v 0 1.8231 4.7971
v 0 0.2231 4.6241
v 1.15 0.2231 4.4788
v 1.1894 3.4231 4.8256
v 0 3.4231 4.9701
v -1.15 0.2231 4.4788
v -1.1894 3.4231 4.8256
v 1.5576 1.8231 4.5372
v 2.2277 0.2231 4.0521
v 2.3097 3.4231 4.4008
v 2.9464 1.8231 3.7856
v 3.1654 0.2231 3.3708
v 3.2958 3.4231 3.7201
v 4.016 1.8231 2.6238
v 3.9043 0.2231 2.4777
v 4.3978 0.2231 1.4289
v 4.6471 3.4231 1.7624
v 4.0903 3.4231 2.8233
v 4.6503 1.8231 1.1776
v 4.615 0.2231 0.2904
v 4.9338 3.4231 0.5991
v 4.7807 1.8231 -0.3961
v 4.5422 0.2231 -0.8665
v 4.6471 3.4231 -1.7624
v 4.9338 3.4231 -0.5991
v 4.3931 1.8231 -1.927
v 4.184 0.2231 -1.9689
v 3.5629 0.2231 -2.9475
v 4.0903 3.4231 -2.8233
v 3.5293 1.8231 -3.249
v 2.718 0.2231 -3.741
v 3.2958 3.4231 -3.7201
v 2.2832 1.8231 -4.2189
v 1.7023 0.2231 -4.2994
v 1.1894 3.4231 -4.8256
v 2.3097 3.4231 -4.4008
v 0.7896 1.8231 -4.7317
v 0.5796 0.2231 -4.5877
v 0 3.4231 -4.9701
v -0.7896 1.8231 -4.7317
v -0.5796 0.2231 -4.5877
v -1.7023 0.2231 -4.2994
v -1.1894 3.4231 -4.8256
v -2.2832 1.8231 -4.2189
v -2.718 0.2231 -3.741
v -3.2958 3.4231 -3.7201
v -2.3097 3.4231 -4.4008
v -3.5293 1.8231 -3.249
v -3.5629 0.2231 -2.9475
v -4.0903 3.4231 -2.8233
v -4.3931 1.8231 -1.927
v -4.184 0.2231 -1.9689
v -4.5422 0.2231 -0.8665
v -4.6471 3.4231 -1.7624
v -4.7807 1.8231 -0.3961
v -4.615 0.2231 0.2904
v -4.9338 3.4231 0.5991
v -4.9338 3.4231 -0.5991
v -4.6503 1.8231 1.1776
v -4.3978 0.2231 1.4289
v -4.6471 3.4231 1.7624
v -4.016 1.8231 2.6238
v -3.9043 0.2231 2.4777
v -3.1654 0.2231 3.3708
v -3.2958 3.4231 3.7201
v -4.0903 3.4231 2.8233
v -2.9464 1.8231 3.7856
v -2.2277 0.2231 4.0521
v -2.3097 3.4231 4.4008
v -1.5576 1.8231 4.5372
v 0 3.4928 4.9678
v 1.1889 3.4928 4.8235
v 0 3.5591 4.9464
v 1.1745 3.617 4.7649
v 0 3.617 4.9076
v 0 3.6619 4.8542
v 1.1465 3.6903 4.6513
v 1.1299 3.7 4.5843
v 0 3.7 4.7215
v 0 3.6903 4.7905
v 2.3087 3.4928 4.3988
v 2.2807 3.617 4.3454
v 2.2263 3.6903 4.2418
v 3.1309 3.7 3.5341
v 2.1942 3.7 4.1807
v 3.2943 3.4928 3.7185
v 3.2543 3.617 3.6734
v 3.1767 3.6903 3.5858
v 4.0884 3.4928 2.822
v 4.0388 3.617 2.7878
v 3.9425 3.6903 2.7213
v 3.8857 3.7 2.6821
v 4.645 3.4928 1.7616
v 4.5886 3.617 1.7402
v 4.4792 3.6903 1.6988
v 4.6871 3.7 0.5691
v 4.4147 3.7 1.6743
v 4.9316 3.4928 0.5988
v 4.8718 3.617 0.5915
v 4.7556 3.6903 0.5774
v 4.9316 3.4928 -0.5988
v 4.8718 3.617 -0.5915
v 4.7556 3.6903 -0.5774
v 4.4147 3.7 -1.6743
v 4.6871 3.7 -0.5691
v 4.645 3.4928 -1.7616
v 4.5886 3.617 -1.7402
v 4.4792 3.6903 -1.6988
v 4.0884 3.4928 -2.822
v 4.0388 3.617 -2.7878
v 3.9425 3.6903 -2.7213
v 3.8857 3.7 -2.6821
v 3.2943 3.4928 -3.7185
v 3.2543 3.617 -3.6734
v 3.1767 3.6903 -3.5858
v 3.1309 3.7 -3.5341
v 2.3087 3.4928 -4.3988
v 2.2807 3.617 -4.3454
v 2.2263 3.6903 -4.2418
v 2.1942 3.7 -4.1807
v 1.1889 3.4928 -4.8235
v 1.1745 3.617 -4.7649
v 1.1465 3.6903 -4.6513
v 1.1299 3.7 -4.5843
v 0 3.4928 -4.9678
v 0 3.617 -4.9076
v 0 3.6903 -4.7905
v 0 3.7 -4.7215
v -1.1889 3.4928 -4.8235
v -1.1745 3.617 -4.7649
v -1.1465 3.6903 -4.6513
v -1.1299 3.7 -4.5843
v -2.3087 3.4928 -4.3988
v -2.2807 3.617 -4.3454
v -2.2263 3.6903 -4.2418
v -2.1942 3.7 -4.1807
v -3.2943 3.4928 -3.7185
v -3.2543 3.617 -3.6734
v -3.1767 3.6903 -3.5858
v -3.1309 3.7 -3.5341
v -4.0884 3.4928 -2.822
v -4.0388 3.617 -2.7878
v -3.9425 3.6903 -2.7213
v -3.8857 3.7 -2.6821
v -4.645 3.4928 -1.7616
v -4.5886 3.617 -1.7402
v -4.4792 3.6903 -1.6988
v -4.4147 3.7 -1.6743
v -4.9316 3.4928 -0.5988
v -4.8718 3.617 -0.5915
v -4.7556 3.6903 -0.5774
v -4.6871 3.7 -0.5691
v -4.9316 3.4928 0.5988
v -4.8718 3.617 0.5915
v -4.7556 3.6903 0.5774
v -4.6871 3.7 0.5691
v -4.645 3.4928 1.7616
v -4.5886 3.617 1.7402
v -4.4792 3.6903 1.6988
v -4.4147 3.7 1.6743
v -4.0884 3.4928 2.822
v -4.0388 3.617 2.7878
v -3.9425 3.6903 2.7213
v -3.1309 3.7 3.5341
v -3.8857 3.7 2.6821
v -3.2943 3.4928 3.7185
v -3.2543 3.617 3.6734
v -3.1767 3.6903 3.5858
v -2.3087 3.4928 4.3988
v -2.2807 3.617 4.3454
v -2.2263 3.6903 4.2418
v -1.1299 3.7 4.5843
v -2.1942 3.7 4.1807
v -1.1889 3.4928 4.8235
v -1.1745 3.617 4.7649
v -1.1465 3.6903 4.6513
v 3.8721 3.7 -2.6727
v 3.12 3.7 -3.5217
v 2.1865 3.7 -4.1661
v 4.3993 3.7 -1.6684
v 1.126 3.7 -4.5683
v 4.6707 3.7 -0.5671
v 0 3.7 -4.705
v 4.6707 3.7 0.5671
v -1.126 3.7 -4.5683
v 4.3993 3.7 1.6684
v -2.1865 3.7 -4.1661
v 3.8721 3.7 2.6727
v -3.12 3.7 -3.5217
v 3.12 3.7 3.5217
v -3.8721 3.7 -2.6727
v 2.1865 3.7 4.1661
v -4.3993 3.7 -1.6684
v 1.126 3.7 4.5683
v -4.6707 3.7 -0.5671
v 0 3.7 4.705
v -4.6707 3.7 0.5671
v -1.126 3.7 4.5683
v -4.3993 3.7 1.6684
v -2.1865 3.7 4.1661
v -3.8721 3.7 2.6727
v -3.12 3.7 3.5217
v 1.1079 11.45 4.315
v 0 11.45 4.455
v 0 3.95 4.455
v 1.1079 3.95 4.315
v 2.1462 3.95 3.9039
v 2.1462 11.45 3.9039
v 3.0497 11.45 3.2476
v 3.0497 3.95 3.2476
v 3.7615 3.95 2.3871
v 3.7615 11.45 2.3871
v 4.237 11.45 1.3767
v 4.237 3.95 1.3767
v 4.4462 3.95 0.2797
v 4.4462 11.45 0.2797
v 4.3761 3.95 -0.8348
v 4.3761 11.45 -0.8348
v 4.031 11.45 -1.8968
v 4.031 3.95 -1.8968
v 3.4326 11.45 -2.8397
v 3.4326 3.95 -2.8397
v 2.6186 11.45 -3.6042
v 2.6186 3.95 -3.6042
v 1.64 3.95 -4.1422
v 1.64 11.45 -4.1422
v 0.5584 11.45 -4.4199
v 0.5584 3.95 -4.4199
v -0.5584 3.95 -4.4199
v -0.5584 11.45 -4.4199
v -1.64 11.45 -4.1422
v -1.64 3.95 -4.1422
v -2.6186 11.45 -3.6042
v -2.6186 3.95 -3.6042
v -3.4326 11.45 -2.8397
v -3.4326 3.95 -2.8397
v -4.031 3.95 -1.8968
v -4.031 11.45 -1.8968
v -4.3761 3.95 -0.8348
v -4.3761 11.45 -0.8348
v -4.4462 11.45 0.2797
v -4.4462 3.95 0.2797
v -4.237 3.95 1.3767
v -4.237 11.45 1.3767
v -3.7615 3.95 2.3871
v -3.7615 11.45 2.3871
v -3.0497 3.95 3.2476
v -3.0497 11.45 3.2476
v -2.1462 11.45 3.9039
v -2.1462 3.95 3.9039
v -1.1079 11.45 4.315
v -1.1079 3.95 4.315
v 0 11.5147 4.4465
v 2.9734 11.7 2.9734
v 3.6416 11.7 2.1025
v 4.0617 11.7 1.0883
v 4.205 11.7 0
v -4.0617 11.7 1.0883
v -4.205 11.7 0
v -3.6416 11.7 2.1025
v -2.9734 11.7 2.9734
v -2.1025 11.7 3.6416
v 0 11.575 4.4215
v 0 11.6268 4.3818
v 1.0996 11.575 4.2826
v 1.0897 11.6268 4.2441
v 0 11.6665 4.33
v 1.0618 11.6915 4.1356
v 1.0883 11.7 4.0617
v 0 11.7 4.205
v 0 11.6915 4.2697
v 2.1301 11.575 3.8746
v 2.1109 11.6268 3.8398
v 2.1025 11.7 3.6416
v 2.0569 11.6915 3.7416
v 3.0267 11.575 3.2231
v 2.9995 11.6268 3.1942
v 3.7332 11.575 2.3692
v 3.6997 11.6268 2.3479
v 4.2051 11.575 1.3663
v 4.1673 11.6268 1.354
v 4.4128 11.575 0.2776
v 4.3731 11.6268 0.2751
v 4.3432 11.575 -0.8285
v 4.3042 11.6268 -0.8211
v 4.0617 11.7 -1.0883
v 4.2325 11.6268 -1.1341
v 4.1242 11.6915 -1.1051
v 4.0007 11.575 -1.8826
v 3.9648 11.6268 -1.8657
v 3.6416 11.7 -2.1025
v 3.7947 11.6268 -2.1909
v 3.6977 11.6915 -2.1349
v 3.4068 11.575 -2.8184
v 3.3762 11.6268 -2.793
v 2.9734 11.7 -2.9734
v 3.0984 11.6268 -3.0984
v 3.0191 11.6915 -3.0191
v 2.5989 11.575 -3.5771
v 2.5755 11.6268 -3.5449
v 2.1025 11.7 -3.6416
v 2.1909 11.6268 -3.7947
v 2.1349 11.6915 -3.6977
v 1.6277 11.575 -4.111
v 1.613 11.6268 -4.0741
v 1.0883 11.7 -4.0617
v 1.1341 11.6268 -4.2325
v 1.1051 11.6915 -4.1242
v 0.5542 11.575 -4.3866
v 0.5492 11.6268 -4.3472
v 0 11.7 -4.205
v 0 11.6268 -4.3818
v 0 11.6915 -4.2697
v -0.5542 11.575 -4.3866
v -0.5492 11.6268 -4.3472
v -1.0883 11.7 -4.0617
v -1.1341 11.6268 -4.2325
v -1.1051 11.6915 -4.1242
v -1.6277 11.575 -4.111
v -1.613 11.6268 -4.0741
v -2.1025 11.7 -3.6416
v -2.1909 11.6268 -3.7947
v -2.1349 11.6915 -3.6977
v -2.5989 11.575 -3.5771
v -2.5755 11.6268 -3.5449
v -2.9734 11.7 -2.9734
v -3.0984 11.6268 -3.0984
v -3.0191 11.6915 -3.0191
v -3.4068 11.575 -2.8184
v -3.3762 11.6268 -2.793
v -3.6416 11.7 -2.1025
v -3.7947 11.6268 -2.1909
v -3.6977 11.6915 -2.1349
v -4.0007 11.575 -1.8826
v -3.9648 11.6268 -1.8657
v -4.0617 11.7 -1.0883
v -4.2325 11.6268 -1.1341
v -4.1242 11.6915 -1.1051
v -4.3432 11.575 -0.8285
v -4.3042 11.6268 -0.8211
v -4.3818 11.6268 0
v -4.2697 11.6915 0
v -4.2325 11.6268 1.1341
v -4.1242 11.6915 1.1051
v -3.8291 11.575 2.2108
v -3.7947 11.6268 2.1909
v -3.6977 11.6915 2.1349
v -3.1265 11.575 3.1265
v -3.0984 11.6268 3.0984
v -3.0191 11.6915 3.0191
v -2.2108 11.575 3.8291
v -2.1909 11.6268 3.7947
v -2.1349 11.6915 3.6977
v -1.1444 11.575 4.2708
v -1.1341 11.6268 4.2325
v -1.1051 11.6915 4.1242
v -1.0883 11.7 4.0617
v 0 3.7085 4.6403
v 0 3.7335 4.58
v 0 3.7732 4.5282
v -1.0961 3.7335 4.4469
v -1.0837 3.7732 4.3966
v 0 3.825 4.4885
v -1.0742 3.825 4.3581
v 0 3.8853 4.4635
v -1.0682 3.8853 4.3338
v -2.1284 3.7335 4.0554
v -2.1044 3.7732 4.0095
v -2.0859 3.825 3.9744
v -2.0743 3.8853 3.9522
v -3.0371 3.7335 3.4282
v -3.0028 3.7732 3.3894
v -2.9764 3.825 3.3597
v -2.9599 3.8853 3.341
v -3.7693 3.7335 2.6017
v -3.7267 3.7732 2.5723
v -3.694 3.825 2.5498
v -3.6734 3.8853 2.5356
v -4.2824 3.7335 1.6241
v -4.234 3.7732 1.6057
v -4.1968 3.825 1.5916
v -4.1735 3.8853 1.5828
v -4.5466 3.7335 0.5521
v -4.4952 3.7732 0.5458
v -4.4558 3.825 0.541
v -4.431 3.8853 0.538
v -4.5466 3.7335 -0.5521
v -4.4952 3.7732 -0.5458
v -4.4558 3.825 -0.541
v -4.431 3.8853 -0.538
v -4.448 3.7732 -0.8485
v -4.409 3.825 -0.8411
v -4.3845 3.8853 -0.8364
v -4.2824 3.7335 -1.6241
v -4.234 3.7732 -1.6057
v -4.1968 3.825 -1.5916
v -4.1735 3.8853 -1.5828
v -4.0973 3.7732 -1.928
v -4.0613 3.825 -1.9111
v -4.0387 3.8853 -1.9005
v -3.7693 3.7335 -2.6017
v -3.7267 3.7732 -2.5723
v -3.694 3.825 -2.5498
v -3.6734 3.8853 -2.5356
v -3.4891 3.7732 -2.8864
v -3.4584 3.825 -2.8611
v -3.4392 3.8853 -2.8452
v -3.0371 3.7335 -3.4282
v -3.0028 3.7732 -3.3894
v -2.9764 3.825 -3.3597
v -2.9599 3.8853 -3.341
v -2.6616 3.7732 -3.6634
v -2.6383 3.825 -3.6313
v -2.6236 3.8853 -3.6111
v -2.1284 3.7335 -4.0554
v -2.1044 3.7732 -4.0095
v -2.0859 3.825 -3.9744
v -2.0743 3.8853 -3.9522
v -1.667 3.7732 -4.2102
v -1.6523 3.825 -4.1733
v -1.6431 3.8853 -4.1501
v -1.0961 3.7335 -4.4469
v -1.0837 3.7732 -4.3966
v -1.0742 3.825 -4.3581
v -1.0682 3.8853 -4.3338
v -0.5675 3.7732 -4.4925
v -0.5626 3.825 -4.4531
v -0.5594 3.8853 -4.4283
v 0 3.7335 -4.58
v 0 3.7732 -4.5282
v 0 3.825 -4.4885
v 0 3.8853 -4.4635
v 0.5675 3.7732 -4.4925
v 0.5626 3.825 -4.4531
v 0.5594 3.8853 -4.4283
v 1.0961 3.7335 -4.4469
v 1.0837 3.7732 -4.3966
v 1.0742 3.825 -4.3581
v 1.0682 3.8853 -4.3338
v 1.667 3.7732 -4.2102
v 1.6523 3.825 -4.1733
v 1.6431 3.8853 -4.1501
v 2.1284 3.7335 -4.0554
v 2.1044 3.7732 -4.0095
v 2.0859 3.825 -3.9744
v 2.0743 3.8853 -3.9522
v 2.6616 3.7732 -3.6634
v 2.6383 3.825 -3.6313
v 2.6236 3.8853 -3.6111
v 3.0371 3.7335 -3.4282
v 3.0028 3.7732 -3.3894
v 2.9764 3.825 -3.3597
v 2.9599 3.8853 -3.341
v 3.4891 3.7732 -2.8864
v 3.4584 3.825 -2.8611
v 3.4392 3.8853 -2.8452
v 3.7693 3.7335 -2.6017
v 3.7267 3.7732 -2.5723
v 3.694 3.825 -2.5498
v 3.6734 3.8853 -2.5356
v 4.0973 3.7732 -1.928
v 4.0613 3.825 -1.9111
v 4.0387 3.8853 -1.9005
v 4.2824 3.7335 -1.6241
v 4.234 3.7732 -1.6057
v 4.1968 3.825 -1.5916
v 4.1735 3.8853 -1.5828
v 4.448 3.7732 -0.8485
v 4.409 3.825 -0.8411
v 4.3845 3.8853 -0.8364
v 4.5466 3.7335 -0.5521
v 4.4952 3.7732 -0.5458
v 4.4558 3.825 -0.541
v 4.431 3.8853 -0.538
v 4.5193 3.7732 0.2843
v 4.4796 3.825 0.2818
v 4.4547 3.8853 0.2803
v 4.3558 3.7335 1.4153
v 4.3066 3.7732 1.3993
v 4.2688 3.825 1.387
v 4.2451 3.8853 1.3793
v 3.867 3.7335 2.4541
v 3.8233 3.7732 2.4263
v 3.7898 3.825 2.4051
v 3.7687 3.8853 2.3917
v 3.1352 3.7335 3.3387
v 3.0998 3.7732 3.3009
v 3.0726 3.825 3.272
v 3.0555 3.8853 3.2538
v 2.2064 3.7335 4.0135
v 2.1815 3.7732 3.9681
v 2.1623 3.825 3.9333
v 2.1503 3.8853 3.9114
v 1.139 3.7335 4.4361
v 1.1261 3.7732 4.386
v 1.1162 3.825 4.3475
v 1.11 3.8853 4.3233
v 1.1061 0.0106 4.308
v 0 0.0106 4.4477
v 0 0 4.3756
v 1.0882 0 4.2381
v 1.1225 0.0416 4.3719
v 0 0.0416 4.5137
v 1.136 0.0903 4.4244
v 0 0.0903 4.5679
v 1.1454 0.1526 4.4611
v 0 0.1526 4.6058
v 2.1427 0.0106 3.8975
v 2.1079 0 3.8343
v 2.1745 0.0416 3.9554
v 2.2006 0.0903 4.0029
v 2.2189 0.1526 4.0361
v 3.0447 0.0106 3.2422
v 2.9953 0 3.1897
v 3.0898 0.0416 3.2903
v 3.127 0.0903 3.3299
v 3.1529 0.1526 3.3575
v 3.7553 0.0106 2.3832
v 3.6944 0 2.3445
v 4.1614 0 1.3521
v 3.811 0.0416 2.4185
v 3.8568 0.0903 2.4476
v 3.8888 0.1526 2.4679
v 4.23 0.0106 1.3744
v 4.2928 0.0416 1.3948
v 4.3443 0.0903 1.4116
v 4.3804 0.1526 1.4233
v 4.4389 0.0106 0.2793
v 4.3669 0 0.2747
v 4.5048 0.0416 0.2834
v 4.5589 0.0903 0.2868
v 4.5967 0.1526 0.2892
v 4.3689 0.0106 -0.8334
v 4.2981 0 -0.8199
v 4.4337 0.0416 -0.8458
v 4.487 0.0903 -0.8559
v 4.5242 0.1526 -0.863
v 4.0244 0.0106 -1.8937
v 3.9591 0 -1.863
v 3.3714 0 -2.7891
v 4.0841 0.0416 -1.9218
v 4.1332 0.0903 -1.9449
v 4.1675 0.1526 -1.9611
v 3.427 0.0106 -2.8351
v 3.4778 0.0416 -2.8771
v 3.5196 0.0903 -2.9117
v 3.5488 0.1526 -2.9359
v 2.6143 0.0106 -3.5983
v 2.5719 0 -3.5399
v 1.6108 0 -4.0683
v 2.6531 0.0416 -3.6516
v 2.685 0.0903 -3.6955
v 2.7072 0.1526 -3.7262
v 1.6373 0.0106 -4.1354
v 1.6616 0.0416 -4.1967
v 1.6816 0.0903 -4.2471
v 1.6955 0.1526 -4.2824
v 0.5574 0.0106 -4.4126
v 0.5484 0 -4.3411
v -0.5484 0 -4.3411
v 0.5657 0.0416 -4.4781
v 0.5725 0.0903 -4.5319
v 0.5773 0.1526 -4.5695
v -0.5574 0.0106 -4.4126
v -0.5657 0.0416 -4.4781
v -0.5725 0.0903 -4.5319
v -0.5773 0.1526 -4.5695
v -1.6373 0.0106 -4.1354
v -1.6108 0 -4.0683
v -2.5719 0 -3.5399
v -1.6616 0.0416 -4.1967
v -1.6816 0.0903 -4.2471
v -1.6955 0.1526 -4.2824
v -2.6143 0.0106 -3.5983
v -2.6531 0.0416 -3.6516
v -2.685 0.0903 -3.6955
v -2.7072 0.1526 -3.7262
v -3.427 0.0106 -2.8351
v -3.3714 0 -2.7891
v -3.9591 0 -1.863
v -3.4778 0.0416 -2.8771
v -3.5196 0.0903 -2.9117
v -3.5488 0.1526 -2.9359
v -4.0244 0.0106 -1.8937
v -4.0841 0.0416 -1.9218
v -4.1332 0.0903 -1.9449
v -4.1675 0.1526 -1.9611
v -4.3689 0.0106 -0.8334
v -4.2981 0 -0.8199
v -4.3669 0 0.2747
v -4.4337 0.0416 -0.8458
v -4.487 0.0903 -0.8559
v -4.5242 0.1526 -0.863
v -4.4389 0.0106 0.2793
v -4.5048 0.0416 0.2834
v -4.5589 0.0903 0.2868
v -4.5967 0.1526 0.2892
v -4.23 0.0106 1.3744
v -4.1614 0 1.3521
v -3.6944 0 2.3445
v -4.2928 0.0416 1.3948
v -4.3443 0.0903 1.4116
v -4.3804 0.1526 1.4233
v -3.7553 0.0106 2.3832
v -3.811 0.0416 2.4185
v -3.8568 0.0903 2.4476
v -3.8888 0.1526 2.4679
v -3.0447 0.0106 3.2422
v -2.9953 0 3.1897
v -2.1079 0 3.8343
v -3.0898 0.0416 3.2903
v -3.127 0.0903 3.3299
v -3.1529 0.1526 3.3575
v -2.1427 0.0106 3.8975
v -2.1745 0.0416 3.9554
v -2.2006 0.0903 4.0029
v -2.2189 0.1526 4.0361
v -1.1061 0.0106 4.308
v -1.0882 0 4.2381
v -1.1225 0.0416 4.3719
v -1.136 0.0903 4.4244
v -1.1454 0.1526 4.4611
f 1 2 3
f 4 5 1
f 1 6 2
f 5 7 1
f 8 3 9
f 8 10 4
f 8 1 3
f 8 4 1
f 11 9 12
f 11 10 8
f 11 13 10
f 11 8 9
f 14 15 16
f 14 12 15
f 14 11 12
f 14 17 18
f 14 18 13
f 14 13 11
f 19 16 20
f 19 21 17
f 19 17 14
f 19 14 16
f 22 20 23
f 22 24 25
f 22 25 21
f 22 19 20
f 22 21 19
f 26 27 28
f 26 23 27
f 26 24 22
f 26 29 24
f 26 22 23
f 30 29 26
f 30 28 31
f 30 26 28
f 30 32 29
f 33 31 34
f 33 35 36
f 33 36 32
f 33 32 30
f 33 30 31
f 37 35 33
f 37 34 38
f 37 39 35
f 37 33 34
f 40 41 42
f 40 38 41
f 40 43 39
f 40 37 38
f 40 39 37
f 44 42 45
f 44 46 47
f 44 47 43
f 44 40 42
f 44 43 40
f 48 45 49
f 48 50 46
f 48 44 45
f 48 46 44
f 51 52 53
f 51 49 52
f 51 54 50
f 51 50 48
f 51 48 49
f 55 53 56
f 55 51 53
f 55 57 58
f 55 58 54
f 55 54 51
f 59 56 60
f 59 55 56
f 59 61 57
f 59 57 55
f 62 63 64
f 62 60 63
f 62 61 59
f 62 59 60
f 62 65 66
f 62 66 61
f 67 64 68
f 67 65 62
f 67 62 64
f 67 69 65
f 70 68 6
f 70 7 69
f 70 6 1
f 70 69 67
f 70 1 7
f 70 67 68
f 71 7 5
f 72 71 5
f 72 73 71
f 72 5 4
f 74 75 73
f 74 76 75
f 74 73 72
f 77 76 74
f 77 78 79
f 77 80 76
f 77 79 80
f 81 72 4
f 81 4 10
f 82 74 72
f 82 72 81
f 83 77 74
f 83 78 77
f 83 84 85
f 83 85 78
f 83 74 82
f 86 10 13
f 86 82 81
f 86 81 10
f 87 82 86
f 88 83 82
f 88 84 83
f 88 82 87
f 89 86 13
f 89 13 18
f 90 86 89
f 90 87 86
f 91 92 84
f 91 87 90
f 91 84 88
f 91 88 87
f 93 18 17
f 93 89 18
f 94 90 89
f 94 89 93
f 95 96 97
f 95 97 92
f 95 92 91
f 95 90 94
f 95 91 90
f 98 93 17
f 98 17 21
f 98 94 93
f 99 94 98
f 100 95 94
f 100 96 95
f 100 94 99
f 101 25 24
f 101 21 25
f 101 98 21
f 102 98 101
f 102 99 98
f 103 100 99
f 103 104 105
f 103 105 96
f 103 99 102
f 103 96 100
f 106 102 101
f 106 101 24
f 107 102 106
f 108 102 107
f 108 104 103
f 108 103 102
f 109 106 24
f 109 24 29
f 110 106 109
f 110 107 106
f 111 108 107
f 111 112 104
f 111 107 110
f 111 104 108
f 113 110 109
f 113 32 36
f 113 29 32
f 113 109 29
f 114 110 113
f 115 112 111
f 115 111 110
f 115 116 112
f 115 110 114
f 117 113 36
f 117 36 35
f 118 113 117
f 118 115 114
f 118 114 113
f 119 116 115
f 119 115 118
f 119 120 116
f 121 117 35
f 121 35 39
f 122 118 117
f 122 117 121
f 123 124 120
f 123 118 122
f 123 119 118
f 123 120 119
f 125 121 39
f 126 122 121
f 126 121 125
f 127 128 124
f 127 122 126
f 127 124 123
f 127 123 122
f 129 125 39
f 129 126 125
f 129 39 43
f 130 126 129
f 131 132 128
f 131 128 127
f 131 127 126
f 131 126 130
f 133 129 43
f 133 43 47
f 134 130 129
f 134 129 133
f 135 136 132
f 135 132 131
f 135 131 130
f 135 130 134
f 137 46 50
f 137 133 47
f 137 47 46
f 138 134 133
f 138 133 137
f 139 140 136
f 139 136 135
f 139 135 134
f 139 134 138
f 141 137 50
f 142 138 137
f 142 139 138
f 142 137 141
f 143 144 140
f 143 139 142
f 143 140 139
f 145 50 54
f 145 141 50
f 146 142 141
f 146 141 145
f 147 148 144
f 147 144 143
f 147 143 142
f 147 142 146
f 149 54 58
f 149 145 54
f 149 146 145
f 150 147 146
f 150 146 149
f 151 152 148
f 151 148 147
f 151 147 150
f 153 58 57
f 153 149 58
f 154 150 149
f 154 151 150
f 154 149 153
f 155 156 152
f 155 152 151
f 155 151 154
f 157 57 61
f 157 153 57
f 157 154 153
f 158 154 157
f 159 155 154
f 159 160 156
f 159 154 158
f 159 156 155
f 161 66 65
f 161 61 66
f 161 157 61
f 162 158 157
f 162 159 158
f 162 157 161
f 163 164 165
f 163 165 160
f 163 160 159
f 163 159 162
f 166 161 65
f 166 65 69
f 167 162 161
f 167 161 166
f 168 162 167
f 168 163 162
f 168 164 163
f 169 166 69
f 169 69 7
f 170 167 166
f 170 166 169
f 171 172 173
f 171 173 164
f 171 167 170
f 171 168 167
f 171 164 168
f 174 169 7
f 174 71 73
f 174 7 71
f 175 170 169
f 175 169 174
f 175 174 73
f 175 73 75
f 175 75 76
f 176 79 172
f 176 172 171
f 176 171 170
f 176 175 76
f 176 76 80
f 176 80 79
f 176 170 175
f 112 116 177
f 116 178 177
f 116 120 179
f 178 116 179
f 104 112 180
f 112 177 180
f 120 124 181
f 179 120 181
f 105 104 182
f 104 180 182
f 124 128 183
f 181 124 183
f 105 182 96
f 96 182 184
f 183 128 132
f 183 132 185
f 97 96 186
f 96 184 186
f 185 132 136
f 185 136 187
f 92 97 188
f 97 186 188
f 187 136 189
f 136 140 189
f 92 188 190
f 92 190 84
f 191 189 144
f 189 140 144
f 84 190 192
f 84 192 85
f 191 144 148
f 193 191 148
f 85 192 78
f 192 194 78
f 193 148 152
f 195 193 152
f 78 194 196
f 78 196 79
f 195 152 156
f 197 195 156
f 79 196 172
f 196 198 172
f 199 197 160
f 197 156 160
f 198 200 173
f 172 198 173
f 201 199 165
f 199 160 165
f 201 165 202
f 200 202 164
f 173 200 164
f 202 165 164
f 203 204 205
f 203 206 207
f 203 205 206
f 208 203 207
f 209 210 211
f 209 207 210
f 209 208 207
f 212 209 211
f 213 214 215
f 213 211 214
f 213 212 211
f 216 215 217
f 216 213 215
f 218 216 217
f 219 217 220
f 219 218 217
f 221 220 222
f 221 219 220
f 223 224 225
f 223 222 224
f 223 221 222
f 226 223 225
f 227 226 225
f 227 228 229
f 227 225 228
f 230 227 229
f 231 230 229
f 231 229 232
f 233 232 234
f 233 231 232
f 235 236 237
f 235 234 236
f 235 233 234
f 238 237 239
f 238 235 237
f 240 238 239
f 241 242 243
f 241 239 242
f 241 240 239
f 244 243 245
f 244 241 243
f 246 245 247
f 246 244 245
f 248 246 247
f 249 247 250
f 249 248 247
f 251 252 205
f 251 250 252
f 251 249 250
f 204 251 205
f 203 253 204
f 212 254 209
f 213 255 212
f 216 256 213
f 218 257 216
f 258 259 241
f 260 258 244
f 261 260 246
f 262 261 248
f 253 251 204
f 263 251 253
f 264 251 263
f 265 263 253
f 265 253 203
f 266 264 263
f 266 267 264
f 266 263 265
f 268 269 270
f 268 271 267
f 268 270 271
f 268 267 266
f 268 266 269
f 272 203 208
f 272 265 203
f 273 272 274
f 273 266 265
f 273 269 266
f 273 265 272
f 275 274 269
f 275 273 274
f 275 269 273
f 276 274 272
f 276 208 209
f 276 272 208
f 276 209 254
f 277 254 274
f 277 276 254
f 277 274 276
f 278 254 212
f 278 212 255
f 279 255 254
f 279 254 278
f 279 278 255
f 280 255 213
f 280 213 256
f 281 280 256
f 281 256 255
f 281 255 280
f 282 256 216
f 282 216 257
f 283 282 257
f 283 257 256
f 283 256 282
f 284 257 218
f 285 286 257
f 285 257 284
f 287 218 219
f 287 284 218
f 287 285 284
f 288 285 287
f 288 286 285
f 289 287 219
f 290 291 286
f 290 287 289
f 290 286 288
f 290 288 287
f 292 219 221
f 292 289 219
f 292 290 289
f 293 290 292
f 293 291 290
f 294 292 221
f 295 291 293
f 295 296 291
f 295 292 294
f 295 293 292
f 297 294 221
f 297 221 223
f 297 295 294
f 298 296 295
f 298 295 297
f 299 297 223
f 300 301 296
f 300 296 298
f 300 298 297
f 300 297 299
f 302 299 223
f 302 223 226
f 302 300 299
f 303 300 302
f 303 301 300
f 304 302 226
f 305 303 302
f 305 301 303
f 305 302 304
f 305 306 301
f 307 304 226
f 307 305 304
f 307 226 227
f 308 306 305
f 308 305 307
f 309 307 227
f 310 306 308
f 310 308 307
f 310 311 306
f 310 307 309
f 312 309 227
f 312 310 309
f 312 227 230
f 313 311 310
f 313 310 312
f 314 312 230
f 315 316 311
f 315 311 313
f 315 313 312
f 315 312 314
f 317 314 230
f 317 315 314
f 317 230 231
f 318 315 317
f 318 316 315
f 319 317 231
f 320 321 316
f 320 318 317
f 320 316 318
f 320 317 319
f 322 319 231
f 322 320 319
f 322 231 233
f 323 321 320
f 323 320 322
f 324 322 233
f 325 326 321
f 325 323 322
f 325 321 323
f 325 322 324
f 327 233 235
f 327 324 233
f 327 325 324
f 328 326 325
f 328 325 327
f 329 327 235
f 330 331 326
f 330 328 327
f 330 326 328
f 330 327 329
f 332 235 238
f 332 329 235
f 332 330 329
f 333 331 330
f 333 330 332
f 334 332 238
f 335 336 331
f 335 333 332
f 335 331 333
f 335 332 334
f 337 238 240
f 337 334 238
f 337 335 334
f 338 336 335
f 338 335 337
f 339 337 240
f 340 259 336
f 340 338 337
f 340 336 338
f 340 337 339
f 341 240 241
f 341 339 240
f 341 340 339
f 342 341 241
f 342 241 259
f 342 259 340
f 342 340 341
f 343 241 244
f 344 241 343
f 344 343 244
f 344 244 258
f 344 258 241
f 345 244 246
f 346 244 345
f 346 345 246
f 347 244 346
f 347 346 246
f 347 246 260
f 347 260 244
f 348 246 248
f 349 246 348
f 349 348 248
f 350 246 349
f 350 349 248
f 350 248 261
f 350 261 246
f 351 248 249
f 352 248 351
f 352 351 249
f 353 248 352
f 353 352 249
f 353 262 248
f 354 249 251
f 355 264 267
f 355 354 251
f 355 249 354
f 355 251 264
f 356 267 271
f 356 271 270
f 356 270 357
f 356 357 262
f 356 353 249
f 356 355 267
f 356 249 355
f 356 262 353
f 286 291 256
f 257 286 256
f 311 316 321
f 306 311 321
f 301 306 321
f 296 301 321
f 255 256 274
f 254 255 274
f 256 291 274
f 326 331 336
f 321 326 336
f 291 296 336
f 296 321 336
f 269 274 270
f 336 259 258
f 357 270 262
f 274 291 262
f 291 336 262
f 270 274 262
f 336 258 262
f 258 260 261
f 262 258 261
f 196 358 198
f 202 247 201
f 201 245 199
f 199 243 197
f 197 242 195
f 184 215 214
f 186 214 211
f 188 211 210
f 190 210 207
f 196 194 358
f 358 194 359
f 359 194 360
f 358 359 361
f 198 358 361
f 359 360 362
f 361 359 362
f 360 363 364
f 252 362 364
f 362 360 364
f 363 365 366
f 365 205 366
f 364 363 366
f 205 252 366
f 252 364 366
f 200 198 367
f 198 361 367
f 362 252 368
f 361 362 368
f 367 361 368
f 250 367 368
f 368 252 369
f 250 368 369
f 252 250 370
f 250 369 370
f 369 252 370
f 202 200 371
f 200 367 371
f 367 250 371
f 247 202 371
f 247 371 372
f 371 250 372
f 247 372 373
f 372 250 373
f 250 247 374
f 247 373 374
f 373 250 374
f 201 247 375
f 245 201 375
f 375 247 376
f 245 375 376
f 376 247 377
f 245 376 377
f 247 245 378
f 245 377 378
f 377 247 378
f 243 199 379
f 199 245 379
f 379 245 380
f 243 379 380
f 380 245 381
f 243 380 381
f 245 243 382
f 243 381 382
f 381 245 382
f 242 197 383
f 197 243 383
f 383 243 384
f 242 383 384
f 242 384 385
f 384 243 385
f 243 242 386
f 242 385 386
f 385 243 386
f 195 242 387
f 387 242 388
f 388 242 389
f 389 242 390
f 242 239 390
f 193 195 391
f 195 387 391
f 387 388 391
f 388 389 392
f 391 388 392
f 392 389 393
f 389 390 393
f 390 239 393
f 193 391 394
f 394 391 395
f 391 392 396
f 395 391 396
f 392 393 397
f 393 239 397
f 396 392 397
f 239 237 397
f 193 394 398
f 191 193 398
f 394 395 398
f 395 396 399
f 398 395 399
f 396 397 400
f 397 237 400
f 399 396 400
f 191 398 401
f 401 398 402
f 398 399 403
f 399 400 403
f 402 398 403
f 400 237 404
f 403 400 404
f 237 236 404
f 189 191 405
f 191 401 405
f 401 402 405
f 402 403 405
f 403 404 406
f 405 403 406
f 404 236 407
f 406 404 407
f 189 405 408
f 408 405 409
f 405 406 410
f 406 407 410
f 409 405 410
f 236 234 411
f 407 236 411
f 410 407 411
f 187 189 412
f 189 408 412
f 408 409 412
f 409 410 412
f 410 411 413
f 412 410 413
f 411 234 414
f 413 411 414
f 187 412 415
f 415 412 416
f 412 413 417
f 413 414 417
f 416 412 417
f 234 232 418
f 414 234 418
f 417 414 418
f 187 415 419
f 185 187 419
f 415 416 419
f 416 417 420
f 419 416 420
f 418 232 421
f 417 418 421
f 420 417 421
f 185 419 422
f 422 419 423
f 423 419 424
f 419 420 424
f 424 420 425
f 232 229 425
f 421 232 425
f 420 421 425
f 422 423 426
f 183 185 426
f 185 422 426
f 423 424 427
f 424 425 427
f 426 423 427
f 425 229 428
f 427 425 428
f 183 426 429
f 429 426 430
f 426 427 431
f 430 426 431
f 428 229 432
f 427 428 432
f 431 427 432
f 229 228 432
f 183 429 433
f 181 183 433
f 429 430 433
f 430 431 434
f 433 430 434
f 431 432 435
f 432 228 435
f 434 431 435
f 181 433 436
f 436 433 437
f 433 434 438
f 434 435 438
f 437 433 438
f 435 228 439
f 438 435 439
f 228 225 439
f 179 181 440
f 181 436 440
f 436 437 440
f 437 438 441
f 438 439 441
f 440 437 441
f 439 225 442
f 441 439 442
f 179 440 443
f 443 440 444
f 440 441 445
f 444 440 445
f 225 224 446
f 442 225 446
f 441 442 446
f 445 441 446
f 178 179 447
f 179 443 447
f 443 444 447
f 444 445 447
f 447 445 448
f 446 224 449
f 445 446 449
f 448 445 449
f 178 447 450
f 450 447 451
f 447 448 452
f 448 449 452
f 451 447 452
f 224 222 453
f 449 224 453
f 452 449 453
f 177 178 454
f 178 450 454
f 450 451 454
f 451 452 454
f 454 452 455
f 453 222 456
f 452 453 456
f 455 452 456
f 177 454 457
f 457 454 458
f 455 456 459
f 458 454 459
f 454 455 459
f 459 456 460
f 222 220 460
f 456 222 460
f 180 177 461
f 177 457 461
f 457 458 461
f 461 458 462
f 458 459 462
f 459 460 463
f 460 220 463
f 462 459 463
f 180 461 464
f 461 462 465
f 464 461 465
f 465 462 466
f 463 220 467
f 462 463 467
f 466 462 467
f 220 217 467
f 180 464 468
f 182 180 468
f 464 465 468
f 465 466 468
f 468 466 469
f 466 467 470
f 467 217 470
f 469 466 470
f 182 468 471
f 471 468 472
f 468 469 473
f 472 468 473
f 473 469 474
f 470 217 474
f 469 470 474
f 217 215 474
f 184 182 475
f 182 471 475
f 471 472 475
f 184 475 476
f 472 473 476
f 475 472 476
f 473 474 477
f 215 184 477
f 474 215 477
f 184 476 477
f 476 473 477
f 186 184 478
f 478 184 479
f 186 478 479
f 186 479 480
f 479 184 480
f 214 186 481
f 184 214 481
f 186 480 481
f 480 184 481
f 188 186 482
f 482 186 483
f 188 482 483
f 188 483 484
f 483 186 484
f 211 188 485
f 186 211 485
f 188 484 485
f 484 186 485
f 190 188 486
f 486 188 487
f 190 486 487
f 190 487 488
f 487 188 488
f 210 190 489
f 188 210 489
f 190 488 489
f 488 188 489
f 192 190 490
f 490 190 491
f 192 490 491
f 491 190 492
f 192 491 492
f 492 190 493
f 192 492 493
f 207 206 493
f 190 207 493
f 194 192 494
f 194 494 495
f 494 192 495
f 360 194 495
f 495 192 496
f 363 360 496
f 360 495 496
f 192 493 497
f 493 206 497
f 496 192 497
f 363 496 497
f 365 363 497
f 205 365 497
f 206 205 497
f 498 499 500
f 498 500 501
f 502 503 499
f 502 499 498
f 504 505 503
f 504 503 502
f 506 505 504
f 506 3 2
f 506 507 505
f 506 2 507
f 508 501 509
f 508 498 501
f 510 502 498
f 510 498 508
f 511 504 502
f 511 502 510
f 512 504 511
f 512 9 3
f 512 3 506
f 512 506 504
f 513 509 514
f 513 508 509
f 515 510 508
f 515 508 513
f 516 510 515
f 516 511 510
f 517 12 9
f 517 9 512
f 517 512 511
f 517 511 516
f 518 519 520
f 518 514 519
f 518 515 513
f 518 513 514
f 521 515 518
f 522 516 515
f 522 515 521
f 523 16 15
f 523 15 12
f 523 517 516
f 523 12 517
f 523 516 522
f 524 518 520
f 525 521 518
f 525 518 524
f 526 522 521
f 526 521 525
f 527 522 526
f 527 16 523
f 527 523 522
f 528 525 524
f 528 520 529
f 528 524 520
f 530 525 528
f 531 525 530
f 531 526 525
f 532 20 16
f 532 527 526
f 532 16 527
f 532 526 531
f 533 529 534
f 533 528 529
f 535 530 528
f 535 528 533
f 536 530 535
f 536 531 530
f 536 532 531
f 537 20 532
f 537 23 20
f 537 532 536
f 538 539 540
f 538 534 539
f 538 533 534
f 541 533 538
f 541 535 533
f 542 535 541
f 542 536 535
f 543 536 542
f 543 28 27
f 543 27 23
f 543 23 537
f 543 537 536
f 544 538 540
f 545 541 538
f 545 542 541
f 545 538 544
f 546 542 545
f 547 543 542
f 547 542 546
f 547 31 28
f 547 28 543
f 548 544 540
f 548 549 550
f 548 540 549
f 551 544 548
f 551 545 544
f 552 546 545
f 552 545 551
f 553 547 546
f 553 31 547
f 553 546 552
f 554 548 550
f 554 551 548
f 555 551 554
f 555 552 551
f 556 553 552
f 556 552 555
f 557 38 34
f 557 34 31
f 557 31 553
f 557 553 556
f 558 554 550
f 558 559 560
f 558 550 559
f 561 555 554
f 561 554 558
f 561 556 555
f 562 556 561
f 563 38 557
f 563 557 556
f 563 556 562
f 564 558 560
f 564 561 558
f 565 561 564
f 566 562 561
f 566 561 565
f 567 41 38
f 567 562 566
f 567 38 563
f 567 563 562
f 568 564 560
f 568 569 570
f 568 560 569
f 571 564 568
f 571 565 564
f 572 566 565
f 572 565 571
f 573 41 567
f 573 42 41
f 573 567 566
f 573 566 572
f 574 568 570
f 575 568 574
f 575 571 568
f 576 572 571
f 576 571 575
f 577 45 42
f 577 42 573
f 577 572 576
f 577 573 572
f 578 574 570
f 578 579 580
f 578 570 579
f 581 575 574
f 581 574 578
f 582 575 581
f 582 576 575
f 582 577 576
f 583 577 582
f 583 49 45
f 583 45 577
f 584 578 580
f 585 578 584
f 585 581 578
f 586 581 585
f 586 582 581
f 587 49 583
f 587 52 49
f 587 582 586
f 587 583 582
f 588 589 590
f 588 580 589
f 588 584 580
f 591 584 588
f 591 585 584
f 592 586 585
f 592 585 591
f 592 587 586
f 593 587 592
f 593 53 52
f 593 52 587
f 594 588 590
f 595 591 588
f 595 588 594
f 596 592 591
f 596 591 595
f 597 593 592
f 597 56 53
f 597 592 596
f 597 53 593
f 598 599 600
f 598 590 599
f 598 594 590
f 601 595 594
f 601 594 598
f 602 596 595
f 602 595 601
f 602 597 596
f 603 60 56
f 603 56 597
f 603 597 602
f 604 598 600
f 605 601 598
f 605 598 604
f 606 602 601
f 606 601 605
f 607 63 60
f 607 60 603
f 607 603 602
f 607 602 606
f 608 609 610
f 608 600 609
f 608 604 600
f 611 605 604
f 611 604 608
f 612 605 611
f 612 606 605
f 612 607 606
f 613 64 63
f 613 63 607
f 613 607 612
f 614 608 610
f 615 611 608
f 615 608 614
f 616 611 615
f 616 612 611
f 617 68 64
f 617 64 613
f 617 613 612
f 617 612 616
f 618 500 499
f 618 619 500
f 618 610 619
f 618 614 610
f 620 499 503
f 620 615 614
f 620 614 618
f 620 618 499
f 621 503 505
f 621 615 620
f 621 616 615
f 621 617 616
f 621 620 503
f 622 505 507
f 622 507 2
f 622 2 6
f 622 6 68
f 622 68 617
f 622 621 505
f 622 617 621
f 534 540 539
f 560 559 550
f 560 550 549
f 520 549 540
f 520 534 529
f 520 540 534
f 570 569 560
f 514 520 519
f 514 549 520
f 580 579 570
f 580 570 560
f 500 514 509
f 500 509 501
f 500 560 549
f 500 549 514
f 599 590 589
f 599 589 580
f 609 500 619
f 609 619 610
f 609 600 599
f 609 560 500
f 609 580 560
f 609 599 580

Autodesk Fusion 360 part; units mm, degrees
sketch "Sketch1" plane through (0, 0, 0) normal (1, 0, 0) x (0, 1, 0)
  line L0 (0, 0) -> (0, 4.6)
  line L1 (0, 4.6) -> (3.7, 5)
  line L2 (3.7, 5) -> (3.7, 4.455)
  line L3 (3.7, 4.455) -> (11.7, 4.455)
  line L4 (11.7, 4.455) -> (11.7, 0)
  line L5 (11.7, 0) -> (0, 0)
  dimension "d1" = 4.455
  dimension "d2" = 3.7
  dimension "d3" = 5
  dimension "d4" = 4.6
  dimension "d5" = 8
revolve "Revolve1" add sketch "Sketch1" angle 360 about axis through (0, 11.7, 0) along (0, -1, 0)
fillet "Fillet1" radius 0.25 5 faces at (2.1309, 2.8778, 4.4248) (0.4697, 3.7, 4.7831) (0.2221, 6.3667, 4.4495) (0.3414, 11.7, 0.134) (0.0152, 0, -1.4325)
equation "d1 = ( 8.91 / 2 ) * 1 mm"
equation "d4 = ( 9.2 / 2 ) * 1 mm"
